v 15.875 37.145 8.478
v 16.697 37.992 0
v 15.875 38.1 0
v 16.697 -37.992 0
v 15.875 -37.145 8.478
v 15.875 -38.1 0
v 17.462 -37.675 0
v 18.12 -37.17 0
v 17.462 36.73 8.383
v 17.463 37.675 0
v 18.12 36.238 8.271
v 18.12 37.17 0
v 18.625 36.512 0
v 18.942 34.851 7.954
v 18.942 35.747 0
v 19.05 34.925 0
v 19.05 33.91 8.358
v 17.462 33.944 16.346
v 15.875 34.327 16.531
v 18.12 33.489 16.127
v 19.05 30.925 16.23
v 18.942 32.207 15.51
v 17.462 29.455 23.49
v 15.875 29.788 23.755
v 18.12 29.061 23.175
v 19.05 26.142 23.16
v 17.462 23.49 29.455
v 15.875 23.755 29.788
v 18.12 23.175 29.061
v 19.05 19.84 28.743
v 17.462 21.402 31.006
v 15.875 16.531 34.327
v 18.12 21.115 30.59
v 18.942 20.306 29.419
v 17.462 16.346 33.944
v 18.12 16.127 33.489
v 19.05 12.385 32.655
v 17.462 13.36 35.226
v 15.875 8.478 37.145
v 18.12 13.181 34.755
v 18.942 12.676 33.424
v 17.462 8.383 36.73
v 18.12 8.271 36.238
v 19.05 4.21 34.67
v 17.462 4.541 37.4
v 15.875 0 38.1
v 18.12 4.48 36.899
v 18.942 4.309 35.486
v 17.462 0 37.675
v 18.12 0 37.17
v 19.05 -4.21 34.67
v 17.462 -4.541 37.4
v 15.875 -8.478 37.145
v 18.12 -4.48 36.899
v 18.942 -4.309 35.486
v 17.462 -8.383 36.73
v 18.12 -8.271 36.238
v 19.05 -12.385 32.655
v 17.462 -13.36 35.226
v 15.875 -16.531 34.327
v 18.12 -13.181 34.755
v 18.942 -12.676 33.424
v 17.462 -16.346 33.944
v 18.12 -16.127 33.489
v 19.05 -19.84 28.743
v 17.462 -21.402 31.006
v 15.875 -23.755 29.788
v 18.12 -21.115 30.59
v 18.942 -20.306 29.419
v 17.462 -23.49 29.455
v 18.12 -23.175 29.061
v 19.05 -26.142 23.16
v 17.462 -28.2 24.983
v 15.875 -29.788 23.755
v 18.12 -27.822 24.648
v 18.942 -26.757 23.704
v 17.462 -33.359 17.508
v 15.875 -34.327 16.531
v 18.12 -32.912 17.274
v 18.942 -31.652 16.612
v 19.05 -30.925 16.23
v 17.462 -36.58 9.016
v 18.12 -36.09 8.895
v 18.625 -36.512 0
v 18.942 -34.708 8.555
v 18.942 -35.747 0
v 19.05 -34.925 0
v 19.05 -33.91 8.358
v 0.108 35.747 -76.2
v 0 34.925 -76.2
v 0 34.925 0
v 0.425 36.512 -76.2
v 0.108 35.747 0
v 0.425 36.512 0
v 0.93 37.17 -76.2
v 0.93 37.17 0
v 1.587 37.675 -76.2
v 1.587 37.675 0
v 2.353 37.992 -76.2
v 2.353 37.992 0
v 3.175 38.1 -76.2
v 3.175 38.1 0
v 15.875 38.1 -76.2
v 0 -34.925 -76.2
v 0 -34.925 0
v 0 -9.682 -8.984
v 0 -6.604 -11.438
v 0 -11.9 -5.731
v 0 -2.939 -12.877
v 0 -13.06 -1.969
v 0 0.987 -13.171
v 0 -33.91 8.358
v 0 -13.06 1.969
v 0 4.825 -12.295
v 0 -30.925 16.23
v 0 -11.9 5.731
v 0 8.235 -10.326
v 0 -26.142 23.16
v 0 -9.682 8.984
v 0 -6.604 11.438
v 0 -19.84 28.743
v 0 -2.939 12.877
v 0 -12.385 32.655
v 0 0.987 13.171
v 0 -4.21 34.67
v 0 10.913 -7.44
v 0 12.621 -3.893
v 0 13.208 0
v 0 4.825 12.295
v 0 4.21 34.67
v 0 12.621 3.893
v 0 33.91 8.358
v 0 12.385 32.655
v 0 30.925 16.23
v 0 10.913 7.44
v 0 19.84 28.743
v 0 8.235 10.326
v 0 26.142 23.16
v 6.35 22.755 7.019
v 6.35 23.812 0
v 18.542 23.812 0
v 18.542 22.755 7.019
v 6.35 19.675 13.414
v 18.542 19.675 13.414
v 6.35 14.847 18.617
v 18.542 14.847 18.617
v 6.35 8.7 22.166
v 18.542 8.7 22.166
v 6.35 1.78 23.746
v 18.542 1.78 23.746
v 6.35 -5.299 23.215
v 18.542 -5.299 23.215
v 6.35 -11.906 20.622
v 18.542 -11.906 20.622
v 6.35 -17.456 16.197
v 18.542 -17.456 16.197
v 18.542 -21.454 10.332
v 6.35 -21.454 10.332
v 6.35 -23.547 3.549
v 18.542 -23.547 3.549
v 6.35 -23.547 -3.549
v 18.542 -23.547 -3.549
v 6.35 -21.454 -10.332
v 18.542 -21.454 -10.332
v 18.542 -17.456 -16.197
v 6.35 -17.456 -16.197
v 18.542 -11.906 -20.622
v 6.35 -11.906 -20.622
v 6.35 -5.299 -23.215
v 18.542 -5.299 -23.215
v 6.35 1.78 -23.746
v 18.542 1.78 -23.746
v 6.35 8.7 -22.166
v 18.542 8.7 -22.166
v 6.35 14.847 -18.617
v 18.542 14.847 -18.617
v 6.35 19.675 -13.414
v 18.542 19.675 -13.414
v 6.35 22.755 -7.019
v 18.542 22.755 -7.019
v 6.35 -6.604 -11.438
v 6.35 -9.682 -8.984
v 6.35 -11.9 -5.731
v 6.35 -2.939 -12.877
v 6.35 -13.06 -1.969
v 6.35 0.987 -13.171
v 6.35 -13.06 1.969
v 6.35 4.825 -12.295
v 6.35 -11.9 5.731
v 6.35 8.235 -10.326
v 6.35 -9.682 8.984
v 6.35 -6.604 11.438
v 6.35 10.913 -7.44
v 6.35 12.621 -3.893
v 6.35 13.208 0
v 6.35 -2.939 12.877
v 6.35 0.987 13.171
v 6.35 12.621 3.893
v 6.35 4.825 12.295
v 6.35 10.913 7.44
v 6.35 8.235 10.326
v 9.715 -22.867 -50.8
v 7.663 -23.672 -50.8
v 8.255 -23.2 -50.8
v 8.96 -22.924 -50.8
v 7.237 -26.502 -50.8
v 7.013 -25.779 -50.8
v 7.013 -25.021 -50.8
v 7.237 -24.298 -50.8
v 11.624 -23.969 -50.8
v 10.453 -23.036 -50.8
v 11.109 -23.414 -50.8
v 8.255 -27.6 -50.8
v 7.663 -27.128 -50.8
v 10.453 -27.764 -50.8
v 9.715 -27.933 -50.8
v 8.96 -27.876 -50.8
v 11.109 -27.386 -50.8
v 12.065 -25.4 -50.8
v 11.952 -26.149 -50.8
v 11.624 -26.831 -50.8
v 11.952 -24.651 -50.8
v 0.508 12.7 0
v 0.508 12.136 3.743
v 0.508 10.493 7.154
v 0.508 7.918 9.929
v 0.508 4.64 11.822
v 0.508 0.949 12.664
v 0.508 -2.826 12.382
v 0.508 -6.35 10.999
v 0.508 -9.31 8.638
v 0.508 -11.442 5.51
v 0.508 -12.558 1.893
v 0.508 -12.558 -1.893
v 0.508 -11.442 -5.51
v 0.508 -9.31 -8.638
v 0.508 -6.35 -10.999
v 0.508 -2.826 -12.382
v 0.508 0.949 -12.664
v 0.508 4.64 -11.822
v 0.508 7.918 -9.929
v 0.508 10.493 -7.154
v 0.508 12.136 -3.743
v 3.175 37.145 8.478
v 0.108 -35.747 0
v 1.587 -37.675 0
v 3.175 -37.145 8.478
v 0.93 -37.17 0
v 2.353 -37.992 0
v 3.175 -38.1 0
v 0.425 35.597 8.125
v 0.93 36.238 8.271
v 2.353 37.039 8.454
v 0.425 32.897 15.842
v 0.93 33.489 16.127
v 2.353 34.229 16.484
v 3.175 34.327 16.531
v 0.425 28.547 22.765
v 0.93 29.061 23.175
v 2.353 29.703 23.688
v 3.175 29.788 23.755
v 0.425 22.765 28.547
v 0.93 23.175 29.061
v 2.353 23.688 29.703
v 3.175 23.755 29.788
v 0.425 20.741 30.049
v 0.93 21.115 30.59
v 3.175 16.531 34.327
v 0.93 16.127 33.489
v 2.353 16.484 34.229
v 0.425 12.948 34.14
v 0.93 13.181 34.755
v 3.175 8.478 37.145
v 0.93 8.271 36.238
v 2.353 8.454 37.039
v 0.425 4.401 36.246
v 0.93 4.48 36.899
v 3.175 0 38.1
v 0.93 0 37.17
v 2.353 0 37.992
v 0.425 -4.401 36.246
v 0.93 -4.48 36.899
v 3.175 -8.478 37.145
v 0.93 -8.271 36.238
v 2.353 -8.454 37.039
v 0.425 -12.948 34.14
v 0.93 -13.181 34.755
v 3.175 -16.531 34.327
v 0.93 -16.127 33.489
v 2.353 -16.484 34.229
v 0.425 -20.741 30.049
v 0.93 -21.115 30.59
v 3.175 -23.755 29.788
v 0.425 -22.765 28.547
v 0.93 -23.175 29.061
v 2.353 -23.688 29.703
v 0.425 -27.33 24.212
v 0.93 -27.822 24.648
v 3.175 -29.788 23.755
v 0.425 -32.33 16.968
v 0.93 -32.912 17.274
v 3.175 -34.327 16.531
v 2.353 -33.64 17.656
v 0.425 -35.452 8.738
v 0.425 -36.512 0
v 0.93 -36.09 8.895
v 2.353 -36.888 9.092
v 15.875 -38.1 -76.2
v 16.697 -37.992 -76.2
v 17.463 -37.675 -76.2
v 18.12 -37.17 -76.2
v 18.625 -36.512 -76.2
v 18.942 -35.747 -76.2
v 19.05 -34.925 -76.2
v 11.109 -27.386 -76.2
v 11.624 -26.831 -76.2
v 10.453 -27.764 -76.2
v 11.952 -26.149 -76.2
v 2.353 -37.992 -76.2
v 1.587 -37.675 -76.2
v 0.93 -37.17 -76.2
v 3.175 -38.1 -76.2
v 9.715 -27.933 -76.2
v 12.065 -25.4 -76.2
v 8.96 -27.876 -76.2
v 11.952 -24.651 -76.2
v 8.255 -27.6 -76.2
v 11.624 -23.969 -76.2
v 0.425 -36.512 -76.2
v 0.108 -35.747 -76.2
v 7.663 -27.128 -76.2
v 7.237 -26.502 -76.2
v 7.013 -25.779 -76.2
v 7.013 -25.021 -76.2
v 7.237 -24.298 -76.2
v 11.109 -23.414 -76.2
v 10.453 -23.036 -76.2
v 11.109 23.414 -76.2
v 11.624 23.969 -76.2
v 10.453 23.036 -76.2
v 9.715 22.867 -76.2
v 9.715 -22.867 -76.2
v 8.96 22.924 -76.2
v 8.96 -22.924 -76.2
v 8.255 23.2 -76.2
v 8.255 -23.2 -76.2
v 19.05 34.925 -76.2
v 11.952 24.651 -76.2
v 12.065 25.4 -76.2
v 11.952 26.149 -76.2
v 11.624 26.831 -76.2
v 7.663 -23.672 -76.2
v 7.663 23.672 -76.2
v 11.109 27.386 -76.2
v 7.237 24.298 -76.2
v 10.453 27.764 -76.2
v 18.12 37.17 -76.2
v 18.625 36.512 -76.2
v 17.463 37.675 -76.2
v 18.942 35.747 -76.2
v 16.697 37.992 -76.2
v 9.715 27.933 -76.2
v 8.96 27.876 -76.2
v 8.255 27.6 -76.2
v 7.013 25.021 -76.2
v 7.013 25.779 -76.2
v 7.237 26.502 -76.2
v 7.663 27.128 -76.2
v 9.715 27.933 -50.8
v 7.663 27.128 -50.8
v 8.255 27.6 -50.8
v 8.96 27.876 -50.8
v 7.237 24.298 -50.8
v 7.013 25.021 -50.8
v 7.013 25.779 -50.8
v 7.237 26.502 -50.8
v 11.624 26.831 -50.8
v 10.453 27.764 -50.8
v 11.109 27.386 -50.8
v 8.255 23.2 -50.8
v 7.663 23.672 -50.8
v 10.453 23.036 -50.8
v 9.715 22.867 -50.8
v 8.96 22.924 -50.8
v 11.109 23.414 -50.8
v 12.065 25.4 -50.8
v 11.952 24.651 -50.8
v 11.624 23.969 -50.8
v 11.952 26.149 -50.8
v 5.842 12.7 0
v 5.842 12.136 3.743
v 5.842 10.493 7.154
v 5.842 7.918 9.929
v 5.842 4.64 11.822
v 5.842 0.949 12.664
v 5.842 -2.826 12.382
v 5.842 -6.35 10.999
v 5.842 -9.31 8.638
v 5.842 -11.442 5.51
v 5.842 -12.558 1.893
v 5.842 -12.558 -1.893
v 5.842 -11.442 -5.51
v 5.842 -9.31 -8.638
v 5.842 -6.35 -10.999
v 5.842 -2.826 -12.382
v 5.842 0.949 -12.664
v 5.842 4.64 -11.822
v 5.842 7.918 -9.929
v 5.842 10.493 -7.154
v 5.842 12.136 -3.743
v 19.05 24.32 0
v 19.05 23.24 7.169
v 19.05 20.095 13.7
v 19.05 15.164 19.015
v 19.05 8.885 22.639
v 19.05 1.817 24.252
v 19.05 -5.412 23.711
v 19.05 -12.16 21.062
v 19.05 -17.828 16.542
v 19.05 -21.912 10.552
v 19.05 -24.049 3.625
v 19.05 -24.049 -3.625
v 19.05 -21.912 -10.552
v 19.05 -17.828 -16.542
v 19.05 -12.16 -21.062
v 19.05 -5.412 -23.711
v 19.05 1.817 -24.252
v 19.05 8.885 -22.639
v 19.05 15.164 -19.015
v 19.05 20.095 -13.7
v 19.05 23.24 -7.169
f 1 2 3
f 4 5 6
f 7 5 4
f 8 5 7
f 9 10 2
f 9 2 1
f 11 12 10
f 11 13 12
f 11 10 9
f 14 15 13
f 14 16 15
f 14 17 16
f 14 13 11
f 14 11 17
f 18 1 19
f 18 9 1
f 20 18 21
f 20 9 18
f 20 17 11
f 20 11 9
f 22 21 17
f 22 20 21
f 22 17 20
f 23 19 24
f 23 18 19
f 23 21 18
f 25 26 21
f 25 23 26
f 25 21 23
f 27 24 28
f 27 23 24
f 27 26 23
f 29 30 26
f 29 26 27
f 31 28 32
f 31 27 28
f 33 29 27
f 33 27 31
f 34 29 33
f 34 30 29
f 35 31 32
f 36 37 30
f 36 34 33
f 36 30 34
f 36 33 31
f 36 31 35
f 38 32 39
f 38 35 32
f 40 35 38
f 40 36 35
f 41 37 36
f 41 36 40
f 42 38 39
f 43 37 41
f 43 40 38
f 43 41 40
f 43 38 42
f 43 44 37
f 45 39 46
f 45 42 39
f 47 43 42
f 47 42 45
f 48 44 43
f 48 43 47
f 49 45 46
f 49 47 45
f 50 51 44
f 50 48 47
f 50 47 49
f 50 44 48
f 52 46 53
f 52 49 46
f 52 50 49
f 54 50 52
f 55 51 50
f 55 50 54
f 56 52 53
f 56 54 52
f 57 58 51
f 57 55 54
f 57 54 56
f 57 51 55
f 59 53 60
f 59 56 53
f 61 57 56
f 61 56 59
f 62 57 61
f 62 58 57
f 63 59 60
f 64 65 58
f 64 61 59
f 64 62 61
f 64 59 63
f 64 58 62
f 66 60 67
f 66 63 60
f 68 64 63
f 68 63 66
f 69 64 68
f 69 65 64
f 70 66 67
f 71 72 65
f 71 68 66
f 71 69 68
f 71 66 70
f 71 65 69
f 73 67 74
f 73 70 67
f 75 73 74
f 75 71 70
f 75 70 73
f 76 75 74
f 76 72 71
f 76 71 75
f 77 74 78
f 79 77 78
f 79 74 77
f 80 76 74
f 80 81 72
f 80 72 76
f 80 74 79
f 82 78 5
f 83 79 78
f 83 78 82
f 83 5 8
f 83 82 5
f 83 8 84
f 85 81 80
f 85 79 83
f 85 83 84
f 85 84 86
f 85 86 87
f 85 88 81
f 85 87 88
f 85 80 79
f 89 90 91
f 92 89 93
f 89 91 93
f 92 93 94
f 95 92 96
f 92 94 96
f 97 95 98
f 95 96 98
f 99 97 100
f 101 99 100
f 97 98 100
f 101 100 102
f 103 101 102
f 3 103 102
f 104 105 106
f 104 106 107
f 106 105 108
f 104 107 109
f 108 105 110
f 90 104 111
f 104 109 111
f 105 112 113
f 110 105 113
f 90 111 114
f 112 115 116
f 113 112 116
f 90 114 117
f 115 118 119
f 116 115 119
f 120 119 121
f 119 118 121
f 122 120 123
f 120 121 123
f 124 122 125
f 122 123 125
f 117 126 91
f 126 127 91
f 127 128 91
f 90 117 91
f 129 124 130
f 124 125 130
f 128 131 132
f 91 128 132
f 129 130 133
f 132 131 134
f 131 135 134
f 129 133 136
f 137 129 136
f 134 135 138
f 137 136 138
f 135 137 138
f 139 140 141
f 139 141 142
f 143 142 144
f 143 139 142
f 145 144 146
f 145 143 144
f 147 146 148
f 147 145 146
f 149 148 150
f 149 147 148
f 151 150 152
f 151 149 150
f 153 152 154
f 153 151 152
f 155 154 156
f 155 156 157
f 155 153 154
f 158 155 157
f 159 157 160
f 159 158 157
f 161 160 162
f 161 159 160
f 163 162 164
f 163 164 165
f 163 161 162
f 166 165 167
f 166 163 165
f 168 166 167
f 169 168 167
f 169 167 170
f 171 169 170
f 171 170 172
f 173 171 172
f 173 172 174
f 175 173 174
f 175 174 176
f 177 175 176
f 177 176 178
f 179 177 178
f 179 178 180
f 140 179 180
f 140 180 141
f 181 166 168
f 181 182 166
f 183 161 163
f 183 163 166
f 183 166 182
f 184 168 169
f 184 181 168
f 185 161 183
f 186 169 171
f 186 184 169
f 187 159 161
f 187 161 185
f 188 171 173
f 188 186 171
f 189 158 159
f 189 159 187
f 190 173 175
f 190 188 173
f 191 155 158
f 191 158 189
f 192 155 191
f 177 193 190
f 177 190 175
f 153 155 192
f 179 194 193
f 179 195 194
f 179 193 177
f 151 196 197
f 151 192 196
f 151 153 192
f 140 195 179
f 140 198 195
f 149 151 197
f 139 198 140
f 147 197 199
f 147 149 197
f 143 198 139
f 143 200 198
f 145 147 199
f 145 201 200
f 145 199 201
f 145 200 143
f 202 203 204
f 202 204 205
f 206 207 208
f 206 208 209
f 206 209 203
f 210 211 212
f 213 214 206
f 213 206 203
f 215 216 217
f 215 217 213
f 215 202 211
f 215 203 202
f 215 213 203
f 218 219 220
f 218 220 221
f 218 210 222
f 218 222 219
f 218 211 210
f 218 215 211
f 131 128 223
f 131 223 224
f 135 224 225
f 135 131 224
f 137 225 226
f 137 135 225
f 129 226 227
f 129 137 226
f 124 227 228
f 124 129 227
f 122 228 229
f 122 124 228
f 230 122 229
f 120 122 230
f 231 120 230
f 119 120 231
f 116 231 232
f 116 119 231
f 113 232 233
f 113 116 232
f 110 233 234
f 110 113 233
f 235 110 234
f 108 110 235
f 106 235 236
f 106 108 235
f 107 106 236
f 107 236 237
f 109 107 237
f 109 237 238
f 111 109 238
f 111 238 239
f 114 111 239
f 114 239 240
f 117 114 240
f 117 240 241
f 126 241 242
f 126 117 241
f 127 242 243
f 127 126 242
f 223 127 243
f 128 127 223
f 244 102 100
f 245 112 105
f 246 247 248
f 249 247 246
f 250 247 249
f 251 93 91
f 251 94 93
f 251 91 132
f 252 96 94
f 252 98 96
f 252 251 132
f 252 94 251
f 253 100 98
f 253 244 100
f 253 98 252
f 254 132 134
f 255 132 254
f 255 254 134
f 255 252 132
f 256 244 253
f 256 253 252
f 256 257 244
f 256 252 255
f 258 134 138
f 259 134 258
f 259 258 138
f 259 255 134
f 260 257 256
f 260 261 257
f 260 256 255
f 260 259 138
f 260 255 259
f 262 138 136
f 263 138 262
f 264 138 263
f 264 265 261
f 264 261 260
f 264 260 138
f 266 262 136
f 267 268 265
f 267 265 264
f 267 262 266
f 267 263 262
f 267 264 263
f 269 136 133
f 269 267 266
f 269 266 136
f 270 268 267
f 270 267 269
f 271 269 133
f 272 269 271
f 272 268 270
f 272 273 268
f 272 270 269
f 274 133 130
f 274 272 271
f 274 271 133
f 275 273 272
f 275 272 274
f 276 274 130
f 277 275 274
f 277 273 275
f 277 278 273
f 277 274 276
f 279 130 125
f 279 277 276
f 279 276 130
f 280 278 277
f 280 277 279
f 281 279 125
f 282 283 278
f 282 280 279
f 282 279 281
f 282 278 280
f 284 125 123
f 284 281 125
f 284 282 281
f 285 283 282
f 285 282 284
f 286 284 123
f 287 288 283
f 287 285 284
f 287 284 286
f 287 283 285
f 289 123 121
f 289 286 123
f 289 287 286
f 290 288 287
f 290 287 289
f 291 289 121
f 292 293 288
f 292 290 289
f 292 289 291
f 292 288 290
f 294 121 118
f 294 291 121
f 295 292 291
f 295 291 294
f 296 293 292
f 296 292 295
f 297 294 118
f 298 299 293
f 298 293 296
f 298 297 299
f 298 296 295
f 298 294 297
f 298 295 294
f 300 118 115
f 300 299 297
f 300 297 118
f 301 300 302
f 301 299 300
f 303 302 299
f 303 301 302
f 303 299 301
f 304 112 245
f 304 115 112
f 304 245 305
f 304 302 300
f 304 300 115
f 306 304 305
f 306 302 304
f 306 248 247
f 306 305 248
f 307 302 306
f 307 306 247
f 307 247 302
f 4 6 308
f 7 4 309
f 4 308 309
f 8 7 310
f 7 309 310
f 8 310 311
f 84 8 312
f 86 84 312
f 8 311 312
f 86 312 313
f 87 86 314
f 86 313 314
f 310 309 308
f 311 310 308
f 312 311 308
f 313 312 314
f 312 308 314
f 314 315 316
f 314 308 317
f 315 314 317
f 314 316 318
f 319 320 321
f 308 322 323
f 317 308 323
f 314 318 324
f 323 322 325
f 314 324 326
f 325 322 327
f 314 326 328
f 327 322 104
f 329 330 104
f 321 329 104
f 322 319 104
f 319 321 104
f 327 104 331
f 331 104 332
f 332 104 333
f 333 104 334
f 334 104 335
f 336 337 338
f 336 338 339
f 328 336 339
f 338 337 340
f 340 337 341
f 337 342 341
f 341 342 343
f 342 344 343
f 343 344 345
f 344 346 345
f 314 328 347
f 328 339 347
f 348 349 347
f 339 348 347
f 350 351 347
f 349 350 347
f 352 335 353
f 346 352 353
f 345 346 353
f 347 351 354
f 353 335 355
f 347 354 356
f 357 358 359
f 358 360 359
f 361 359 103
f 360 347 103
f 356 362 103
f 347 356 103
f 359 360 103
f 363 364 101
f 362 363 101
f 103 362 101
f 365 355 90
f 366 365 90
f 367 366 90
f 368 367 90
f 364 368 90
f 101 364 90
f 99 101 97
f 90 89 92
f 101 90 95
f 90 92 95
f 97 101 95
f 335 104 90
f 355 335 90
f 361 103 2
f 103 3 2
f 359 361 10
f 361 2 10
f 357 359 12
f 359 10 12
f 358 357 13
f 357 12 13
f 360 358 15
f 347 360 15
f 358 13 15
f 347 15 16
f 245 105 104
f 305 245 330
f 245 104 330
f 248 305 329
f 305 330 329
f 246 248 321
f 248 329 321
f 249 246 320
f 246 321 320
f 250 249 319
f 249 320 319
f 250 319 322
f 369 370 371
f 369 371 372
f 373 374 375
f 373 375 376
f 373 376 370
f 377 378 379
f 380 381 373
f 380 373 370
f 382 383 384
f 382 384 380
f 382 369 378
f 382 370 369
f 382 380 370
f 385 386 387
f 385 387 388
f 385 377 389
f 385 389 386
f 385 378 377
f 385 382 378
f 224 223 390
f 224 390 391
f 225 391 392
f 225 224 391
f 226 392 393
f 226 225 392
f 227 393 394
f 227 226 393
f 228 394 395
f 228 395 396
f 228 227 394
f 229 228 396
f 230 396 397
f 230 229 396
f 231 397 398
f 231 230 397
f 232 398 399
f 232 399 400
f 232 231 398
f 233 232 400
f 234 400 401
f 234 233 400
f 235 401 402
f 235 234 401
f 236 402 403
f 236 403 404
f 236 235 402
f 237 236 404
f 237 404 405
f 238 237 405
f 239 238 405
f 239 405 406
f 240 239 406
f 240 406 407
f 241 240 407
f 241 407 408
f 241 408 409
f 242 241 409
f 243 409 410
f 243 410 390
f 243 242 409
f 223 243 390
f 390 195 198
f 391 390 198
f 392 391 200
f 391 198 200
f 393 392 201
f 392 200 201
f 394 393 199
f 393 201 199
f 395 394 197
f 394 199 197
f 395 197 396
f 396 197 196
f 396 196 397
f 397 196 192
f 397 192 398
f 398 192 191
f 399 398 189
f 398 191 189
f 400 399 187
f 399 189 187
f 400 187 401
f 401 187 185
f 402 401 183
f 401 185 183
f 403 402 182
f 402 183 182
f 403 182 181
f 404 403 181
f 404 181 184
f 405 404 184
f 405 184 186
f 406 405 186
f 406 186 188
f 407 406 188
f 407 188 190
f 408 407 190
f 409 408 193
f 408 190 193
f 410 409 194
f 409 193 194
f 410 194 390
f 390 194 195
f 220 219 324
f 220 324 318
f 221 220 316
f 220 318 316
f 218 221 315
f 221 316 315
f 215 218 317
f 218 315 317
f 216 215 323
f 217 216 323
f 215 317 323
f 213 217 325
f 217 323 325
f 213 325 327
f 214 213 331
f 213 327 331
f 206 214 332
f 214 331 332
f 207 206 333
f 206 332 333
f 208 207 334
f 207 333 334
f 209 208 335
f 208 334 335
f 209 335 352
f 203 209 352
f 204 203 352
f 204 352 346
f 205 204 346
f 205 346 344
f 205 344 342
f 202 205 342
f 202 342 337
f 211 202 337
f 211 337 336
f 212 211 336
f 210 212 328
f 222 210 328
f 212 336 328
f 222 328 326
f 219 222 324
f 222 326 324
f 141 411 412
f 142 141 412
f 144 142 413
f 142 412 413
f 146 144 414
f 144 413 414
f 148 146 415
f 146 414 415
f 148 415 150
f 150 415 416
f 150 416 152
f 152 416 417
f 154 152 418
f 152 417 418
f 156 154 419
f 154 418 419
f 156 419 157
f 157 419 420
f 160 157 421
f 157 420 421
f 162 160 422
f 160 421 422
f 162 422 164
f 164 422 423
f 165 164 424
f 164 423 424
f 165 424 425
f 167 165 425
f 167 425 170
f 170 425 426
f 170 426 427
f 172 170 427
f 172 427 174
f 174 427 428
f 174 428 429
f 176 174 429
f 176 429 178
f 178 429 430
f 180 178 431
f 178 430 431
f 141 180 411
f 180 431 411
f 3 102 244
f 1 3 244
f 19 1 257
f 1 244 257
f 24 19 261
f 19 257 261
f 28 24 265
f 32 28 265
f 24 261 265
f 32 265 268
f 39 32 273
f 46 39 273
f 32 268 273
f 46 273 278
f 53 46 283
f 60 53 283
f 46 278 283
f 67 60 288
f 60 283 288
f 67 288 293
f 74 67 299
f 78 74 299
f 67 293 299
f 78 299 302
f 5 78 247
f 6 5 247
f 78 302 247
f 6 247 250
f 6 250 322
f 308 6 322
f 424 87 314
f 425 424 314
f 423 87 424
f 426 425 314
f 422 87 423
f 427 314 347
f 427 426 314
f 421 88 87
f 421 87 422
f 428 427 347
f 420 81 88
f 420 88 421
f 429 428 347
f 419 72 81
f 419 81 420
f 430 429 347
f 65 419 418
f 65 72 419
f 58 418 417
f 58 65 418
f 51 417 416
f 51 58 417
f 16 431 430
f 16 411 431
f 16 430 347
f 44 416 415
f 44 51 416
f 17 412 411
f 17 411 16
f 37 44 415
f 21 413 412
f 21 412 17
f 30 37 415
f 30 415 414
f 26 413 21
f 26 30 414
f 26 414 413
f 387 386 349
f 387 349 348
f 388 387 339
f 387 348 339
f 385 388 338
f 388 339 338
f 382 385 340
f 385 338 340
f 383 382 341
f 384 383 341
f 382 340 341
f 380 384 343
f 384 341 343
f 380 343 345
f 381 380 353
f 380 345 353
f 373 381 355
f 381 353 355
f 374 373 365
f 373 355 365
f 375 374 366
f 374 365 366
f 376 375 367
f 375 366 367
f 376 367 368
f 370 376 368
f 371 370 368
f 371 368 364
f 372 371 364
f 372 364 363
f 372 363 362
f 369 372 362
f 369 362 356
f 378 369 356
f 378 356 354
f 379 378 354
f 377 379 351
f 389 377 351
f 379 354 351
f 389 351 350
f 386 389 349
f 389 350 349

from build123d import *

# Parameters (mm, degrees)
F0_R     = 23.8125
F1_DEPTH = 19.05
F0_R_2   = 12.7
F2_DEPTH = 6.35
F3_SIZE  = 0.508
F4_R     = 2.54
F5_DEPTH = 25.4
F6_R     = 3.175


with BuildPart() as f1:
    # F0 (on Right) → F1 (new body)
    with BuildSketch(Plane.YZ):
        with BuildLine():
            Line((-38.1, -76.2), (38.1, -76.2))
            Line((38.1, -76.2), (38.1, 0))
            ThreePointArc((38.1, 0), (0, 38.1), (-38.1, 0))
            Line((-38.1, 0), (-38.1, -76.2))
        make_face()
        Circle(F0_R, mode=Mode.SUBTRACT)
    extrude(amount=F1_DEPTH)

    # F0 (on Right) → F2 (join)
    with BuildSketch(Plane.YZ):
        Circle(F0_R)
        Circle(F0_R_2, mode=Mode.SUBTRACT)
    extrude(amount=F2_DEPTH)

    # F3
    f3_edges = [f1.edges().sort_by_distance(p)[0] for p in [
        (0, -12.7, 0),
        (19.05, -23.8125, 0),
        (6.35, -12.7, 0),
    ]]
    chamfer(f3_edges, length=F3_SIZE)

    # F4 (on face) → F5 (cut)
    with BuildSketch(Plane(origin=(0, 0, -76.2), x_dir=(1, 0, 0), z_dir=(0, 0, -1))):
        with Locations((9.525, 25.4)):
            Circle(F4_R)
        with Locations((9.525, -25.4)):
            Circle(F4_R)
    extrude(amount=-F5_DEPTH, mode=Mode.SUBTRACT)

    # F6
    f6_edges = [f1.edges().sort_by_distance(p)[0] for p in [
        (19.05, -38.1, -38.1),
        (0, -38.1, -38.1),
    ]]
    fillet(f6_edges, radius=F6_R)


solid = f1.part
